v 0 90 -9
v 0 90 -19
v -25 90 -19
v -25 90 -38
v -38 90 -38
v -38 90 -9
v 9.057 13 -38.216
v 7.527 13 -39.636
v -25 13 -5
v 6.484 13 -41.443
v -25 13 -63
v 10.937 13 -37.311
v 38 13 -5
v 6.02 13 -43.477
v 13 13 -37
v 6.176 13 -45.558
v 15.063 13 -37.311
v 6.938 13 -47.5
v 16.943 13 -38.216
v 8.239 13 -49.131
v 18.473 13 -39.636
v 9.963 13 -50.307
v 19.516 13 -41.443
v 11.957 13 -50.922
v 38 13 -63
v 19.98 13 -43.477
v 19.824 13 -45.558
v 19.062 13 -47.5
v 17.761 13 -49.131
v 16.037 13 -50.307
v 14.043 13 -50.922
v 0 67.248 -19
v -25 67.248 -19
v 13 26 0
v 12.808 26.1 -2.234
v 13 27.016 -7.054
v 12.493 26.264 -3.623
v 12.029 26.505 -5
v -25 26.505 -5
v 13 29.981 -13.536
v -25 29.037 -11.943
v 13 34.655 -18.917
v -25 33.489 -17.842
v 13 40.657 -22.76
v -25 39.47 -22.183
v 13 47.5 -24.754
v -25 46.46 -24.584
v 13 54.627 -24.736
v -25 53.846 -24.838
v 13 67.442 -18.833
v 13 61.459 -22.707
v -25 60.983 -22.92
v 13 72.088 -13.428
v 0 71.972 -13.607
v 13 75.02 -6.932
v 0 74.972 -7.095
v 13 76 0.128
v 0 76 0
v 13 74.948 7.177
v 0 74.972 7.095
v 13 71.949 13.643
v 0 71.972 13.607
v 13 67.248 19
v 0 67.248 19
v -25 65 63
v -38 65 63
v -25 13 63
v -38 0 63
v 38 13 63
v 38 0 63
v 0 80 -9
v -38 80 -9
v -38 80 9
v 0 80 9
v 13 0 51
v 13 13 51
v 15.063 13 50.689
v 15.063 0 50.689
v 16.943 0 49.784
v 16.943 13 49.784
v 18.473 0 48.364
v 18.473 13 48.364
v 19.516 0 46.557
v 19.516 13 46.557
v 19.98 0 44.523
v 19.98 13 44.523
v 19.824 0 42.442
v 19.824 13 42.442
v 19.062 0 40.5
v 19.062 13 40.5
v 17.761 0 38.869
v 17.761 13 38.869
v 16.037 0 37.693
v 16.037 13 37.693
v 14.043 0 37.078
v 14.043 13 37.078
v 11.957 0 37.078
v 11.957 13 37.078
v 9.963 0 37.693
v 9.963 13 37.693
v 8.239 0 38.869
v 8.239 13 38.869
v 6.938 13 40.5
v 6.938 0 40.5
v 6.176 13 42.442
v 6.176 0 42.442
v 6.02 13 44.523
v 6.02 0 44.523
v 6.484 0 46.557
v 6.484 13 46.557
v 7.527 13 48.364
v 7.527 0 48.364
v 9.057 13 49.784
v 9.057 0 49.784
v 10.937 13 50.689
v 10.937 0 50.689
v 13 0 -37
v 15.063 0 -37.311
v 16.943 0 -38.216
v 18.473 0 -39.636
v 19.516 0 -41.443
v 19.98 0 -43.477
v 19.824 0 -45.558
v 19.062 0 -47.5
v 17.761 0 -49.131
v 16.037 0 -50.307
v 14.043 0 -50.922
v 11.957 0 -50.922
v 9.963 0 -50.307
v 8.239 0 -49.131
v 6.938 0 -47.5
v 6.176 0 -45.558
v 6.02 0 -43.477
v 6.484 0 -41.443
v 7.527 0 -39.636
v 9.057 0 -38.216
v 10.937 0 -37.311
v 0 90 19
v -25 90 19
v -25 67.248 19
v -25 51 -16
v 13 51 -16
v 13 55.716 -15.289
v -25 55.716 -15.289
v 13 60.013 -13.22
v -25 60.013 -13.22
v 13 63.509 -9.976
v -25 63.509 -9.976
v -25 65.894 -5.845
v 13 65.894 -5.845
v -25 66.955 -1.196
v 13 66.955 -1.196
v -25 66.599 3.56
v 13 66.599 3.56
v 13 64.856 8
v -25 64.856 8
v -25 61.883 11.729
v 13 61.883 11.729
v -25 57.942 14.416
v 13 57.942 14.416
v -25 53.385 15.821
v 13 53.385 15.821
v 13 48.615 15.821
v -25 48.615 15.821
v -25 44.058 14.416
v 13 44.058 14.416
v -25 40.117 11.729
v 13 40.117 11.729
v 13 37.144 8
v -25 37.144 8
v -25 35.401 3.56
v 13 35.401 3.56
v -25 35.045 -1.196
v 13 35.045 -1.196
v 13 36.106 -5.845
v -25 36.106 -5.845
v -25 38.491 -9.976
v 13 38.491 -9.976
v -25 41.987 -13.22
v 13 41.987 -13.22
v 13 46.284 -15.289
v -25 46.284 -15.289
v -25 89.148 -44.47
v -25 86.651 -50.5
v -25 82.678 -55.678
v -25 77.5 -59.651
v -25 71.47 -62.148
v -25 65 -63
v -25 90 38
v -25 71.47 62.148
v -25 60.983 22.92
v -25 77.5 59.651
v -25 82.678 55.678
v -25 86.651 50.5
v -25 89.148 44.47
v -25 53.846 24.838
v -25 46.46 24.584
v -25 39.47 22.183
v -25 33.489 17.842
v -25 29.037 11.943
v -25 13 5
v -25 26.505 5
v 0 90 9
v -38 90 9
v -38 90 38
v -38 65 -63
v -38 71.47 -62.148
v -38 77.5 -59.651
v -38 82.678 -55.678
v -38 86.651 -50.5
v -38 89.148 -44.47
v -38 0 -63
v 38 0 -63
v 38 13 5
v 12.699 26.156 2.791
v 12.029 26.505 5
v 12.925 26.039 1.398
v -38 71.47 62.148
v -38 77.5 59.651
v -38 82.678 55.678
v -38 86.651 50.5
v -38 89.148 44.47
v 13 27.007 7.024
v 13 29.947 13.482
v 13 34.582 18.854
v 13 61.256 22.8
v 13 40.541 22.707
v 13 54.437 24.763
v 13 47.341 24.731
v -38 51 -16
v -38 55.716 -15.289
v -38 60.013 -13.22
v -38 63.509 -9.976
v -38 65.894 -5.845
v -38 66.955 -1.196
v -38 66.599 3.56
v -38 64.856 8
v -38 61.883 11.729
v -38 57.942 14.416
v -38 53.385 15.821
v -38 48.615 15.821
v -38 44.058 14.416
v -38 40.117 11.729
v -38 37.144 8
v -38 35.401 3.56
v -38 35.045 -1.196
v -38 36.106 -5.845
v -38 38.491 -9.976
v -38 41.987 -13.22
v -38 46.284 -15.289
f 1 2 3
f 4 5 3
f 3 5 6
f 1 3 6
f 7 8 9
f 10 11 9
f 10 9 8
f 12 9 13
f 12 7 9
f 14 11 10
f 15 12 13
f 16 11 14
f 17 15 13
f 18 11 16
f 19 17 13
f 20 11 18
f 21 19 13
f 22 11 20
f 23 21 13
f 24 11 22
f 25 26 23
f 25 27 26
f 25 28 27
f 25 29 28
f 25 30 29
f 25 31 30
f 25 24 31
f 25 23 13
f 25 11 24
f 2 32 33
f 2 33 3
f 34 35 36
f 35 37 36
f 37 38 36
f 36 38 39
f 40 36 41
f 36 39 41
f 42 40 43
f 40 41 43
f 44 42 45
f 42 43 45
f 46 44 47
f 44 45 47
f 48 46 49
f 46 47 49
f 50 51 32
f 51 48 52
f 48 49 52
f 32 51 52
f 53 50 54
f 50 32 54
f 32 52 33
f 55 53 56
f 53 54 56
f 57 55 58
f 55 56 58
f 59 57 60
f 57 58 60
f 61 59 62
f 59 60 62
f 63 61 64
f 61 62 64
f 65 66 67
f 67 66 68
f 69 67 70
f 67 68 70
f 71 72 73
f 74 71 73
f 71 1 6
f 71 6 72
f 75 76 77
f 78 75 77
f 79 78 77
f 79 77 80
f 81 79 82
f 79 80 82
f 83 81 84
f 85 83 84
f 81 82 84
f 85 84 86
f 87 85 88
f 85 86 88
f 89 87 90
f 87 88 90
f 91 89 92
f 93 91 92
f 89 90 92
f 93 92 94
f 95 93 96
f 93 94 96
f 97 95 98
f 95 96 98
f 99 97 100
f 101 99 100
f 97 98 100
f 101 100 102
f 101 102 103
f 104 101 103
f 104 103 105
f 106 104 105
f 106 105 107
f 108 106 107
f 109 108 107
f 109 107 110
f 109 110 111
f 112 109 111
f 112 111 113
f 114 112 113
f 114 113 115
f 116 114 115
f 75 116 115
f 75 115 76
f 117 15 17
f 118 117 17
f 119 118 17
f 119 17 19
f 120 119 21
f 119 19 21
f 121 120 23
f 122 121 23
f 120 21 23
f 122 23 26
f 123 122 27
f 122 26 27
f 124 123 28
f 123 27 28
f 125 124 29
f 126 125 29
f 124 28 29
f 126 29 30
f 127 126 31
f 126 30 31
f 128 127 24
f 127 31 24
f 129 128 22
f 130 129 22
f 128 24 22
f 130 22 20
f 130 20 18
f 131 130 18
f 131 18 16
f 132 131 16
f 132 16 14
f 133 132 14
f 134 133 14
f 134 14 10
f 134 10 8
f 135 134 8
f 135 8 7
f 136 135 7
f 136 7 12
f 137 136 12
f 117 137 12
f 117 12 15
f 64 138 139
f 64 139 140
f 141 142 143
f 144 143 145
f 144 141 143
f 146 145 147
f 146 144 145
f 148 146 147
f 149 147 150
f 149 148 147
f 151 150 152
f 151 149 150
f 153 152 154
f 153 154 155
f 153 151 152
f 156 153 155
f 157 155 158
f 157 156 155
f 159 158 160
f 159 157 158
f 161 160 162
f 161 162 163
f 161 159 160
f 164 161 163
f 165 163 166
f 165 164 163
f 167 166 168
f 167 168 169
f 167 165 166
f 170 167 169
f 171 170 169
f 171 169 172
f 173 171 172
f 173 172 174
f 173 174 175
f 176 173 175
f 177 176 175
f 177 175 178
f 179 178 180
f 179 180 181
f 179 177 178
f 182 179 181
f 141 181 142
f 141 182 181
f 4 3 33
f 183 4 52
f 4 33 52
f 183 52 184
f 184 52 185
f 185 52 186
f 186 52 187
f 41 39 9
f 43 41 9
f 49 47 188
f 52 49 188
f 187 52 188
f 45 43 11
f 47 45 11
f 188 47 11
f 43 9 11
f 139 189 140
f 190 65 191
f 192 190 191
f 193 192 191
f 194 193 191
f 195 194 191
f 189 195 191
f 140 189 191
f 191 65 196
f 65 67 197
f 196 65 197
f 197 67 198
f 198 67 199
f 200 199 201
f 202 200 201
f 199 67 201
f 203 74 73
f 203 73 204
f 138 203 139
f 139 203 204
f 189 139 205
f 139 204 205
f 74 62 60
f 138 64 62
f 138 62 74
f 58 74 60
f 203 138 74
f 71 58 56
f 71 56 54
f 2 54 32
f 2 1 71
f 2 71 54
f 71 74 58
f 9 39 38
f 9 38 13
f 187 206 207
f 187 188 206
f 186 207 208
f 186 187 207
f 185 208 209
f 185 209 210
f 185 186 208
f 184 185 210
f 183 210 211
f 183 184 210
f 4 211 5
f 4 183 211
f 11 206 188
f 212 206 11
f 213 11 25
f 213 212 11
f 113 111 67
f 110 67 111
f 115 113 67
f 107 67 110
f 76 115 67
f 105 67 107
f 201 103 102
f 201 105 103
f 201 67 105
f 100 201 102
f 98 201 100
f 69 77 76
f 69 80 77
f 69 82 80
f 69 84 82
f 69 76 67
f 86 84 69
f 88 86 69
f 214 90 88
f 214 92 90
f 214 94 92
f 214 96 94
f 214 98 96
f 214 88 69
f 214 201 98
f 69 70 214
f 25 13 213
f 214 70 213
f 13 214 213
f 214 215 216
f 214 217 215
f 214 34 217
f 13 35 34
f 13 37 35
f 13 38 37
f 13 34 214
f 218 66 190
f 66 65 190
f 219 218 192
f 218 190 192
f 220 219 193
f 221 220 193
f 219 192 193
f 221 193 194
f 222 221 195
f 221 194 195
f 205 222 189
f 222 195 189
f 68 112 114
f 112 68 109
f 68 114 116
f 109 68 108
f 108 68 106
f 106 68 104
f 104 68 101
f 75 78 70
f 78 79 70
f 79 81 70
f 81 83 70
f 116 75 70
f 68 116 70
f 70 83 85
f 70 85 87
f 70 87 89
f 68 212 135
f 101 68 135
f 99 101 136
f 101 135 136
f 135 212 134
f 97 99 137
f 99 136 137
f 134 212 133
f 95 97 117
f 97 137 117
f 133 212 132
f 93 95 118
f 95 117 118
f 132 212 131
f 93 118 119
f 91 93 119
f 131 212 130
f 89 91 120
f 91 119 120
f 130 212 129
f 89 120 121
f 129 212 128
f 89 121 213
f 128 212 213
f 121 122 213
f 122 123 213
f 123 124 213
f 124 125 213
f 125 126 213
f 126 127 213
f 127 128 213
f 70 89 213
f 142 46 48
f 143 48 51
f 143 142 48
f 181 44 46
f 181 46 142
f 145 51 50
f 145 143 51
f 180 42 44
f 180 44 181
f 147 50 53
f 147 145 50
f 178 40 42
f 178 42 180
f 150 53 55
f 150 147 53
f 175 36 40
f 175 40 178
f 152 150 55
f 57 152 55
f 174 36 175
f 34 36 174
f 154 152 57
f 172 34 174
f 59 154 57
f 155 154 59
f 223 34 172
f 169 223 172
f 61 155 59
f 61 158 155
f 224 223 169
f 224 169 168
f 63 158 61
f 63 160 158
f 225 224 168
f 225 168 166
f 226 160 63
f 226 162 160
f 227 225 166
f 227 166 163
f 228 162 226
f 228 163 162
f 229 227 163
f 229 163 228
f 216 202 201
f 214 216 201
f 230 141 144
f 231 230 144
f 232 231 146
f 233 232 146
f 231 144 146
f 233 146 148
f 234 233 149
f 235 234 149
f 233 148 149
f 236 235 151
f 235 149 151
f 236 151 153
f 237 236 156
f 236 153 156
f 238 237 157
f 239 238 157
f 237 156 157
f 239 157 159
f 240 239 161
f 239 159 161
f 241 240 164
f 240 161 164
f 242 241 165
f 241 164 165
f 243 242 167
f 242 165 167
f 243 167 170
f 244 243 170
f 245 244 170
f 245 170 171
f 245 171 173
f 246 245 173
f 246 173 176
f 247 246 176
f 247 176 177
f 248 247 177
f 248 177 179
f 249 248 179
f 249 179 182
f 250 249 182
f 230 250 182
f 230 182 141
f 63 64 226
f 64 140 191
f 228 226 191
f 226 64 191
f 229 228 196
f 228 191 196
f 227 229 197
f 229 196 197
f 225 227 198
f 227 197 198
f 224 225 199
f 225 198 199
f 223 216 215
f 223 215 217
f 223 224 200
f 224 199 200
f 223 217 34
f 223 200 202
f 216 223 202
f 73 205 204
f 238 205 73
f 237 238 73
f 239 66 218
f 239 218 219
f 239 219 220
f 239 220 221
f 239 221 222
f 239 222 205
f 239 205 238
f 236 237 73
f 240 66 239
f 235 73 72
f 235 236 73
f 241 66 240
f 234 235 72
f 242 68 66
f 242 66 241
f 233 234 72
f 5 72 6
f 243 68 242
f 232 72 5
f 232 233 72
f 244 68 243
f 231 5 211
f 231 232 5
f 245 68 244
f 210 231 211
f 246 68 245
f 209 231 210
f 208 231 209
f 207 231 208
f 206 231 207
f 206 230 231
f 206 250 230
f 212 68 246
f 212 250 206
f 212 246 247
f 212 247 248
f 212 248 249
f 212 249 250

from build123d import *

# Parameters (mm, degrees)
SKETCH1_W           = 76
SKETCH1_H           = 126
BOSS_EXTRUDE1_DEPTH = 13
SKETCH2_W           = 13
SKETCH2_H           = 126
BOSS_EXTRUDE2_DEPTH = 77
FILLET1_R           = 25
SKETCH3_W           = 18
SKETCH3_H           = 10
CUT_EXTRUDE1_DEPTH  = 127.641225515
BOSS_EXTRUDE3_DEPTH = 25
SKETCH3_4_R         = 16
BOSS_EXTRUDE4_DEPTH = 38
RIB1_REACH          = 118.245
SKETCH4_WALL_W      = 262.668865642
SKETCH4_WALL_H      = 10
SKETCH5_R           = 7
CUT_EXTRUDE2_DEPTH  = 107.498826285
SKETCH3_5_R         = 16
CUT_EXTRUDE3_DEPTH  = 127.641225515


with BuildPart() as part:
    # Sketch1 → Boss-Extrude1 (new body)
    with BuildSketch(Plane(origin=(0, 0, 0), x_dir=(1, 0, 0), z_dir=(0, 1, 0))):
        Rectangle(SKETCH1_W, SKETCH1_H)
    extrude(amount=BOSS_EXTRUDE1_DEPTH)

    # Sketch2 → Boss-Extrude2 (add)
    with BuildSketch(Plane(origin=(0, 13, 0), x_dir=(1, 0, 0), z_dir=(0, 1, 0))):
        with Locations((-31.5, 0)):
            Rectangle(SKETCH2_W, SKETCH2_H)
    extrude(amount=BOSS_EXTRUDE2_DEPTH)

    # Fillet1
    fillet1_edges = [part.edges().sort_by_distance(p)[0] for p in [
        (-31.5, 90, -63),
        (-31.5, 90, 63),
    ]]
    fillet(fillet1_edges, radius=FILLET1_R)

    # Sketch3 → Cut-Extrude1 (cut, through all)
    with BuildSketch(Plane(origin=(-25, 0, 0), x_dir=(0, 0, -1), z_dir=(1, 0, 0))):
        with Locations((0, 85)):
            Rectangle(SKETCH3_W, SKETCH3_H)
    extrude(amount=-CUT_EXTRUDE1_DEPTH, mode=Mode.SUBTRACT)

    # Sketch3<3> → Boss-Extrude3 (add)
    with BuildSketch(Plane(origin=(-25, 0, 0), x_dir=(0, 0, -1), z_dir=(1, 0, 0))):
        with BuildLine():
            Line((-9, 80), (-9, 90))
            Line((-9, 90), (-19, 90))
            Line((-19, 90), (-19, 67.248076809))
            ThreePointArc((-19, 67.248076809), (0, 76), (19, 67.248076809))
            Line((19, 67.248076809), (19, 90))
            Line((19, 90), (9, 90))
            Line((9, 90), (9, 80))
            Line((9, 80), (-9, 80))
        make_face()
    extrude(amount=BOSS_EXTRUDE3_DEPTH)

    # Sketch3<4> → Boss-Extrude4 (add)
    with BuildSketch(Plane(origin=(-25, 0, 0), x_dir=(0, 0, -1), z_dir=(1, 0, 0))):
        with BuildLine():
            ThreePointArc((19, 67.248076809), (0, 76), (-19, 67.248076809))
            ThreePointArc((-19, 67.248076809), (-8.660254038, 27.547921201), (25, 51))
            ThreePointArc((25, 51), (23.452078799, 59.660254038), (19, 67.248076809))
        make_face()
        with Locations((0, 51)):
            Circle(SKETCH3_4_R, mode=Mode.SUBTRACT)
    extrude(amount=BOSS_EXTRUDE4_DEPTH)

    # Sketch4 wall → Rib1 (add, up to next)
    with BuildSketch(Plane(origin=(25.5, 19.5, 0), x_dir=(0.887216801235, -0.461352736642, 0), z_dir=(0.461352736642, 0.887216801235, 0)), mode=Mode.PRIVATE) as rib1_sk1:
        Rectangle(SKETCH4_WALL_W, SKETCH4_WALL_H)
    rib1_tool1 = extrude(rib1_sk1.sketch, amount=-RIB1_REACH, mode=Mode.PRIVATE) - part.part
    add(rib1_tool1.solids().sort_by_distance((25.5, 19.5, 0))[0])

    # Sketch5 → Cut-Extrude2 (cut, through all)
    with BuildSketch(Plane(origin=(0, 13, 0), x_dir=(1, 0, 0), z_dir=(0, 1, 0))):
        with Locations((13, -44)):
            Circle(SKETCH5_R)
        with Locations((13, 44)):
            Circle(SKETCH5_R)
    extrude(amount=-CUT_EXTRUDE2_DEPTH, mode=Mode.SUBTRACT)

    # Sketch3<5> → Cut-Extrude3 (cut, through all)
    with BuildSketch(Plane(origin=(-25, 0, 0), x_dir=(0, 0, -1), z_dir=(1, 0, 0))):
        with Locations((0, 51)):
            Circle(SKETCH3_5_R)
    extrude(amount=-CUT_EXTRUDE3_DEPTH, mode=Mode.SUBTRACT)


solid = part.part
